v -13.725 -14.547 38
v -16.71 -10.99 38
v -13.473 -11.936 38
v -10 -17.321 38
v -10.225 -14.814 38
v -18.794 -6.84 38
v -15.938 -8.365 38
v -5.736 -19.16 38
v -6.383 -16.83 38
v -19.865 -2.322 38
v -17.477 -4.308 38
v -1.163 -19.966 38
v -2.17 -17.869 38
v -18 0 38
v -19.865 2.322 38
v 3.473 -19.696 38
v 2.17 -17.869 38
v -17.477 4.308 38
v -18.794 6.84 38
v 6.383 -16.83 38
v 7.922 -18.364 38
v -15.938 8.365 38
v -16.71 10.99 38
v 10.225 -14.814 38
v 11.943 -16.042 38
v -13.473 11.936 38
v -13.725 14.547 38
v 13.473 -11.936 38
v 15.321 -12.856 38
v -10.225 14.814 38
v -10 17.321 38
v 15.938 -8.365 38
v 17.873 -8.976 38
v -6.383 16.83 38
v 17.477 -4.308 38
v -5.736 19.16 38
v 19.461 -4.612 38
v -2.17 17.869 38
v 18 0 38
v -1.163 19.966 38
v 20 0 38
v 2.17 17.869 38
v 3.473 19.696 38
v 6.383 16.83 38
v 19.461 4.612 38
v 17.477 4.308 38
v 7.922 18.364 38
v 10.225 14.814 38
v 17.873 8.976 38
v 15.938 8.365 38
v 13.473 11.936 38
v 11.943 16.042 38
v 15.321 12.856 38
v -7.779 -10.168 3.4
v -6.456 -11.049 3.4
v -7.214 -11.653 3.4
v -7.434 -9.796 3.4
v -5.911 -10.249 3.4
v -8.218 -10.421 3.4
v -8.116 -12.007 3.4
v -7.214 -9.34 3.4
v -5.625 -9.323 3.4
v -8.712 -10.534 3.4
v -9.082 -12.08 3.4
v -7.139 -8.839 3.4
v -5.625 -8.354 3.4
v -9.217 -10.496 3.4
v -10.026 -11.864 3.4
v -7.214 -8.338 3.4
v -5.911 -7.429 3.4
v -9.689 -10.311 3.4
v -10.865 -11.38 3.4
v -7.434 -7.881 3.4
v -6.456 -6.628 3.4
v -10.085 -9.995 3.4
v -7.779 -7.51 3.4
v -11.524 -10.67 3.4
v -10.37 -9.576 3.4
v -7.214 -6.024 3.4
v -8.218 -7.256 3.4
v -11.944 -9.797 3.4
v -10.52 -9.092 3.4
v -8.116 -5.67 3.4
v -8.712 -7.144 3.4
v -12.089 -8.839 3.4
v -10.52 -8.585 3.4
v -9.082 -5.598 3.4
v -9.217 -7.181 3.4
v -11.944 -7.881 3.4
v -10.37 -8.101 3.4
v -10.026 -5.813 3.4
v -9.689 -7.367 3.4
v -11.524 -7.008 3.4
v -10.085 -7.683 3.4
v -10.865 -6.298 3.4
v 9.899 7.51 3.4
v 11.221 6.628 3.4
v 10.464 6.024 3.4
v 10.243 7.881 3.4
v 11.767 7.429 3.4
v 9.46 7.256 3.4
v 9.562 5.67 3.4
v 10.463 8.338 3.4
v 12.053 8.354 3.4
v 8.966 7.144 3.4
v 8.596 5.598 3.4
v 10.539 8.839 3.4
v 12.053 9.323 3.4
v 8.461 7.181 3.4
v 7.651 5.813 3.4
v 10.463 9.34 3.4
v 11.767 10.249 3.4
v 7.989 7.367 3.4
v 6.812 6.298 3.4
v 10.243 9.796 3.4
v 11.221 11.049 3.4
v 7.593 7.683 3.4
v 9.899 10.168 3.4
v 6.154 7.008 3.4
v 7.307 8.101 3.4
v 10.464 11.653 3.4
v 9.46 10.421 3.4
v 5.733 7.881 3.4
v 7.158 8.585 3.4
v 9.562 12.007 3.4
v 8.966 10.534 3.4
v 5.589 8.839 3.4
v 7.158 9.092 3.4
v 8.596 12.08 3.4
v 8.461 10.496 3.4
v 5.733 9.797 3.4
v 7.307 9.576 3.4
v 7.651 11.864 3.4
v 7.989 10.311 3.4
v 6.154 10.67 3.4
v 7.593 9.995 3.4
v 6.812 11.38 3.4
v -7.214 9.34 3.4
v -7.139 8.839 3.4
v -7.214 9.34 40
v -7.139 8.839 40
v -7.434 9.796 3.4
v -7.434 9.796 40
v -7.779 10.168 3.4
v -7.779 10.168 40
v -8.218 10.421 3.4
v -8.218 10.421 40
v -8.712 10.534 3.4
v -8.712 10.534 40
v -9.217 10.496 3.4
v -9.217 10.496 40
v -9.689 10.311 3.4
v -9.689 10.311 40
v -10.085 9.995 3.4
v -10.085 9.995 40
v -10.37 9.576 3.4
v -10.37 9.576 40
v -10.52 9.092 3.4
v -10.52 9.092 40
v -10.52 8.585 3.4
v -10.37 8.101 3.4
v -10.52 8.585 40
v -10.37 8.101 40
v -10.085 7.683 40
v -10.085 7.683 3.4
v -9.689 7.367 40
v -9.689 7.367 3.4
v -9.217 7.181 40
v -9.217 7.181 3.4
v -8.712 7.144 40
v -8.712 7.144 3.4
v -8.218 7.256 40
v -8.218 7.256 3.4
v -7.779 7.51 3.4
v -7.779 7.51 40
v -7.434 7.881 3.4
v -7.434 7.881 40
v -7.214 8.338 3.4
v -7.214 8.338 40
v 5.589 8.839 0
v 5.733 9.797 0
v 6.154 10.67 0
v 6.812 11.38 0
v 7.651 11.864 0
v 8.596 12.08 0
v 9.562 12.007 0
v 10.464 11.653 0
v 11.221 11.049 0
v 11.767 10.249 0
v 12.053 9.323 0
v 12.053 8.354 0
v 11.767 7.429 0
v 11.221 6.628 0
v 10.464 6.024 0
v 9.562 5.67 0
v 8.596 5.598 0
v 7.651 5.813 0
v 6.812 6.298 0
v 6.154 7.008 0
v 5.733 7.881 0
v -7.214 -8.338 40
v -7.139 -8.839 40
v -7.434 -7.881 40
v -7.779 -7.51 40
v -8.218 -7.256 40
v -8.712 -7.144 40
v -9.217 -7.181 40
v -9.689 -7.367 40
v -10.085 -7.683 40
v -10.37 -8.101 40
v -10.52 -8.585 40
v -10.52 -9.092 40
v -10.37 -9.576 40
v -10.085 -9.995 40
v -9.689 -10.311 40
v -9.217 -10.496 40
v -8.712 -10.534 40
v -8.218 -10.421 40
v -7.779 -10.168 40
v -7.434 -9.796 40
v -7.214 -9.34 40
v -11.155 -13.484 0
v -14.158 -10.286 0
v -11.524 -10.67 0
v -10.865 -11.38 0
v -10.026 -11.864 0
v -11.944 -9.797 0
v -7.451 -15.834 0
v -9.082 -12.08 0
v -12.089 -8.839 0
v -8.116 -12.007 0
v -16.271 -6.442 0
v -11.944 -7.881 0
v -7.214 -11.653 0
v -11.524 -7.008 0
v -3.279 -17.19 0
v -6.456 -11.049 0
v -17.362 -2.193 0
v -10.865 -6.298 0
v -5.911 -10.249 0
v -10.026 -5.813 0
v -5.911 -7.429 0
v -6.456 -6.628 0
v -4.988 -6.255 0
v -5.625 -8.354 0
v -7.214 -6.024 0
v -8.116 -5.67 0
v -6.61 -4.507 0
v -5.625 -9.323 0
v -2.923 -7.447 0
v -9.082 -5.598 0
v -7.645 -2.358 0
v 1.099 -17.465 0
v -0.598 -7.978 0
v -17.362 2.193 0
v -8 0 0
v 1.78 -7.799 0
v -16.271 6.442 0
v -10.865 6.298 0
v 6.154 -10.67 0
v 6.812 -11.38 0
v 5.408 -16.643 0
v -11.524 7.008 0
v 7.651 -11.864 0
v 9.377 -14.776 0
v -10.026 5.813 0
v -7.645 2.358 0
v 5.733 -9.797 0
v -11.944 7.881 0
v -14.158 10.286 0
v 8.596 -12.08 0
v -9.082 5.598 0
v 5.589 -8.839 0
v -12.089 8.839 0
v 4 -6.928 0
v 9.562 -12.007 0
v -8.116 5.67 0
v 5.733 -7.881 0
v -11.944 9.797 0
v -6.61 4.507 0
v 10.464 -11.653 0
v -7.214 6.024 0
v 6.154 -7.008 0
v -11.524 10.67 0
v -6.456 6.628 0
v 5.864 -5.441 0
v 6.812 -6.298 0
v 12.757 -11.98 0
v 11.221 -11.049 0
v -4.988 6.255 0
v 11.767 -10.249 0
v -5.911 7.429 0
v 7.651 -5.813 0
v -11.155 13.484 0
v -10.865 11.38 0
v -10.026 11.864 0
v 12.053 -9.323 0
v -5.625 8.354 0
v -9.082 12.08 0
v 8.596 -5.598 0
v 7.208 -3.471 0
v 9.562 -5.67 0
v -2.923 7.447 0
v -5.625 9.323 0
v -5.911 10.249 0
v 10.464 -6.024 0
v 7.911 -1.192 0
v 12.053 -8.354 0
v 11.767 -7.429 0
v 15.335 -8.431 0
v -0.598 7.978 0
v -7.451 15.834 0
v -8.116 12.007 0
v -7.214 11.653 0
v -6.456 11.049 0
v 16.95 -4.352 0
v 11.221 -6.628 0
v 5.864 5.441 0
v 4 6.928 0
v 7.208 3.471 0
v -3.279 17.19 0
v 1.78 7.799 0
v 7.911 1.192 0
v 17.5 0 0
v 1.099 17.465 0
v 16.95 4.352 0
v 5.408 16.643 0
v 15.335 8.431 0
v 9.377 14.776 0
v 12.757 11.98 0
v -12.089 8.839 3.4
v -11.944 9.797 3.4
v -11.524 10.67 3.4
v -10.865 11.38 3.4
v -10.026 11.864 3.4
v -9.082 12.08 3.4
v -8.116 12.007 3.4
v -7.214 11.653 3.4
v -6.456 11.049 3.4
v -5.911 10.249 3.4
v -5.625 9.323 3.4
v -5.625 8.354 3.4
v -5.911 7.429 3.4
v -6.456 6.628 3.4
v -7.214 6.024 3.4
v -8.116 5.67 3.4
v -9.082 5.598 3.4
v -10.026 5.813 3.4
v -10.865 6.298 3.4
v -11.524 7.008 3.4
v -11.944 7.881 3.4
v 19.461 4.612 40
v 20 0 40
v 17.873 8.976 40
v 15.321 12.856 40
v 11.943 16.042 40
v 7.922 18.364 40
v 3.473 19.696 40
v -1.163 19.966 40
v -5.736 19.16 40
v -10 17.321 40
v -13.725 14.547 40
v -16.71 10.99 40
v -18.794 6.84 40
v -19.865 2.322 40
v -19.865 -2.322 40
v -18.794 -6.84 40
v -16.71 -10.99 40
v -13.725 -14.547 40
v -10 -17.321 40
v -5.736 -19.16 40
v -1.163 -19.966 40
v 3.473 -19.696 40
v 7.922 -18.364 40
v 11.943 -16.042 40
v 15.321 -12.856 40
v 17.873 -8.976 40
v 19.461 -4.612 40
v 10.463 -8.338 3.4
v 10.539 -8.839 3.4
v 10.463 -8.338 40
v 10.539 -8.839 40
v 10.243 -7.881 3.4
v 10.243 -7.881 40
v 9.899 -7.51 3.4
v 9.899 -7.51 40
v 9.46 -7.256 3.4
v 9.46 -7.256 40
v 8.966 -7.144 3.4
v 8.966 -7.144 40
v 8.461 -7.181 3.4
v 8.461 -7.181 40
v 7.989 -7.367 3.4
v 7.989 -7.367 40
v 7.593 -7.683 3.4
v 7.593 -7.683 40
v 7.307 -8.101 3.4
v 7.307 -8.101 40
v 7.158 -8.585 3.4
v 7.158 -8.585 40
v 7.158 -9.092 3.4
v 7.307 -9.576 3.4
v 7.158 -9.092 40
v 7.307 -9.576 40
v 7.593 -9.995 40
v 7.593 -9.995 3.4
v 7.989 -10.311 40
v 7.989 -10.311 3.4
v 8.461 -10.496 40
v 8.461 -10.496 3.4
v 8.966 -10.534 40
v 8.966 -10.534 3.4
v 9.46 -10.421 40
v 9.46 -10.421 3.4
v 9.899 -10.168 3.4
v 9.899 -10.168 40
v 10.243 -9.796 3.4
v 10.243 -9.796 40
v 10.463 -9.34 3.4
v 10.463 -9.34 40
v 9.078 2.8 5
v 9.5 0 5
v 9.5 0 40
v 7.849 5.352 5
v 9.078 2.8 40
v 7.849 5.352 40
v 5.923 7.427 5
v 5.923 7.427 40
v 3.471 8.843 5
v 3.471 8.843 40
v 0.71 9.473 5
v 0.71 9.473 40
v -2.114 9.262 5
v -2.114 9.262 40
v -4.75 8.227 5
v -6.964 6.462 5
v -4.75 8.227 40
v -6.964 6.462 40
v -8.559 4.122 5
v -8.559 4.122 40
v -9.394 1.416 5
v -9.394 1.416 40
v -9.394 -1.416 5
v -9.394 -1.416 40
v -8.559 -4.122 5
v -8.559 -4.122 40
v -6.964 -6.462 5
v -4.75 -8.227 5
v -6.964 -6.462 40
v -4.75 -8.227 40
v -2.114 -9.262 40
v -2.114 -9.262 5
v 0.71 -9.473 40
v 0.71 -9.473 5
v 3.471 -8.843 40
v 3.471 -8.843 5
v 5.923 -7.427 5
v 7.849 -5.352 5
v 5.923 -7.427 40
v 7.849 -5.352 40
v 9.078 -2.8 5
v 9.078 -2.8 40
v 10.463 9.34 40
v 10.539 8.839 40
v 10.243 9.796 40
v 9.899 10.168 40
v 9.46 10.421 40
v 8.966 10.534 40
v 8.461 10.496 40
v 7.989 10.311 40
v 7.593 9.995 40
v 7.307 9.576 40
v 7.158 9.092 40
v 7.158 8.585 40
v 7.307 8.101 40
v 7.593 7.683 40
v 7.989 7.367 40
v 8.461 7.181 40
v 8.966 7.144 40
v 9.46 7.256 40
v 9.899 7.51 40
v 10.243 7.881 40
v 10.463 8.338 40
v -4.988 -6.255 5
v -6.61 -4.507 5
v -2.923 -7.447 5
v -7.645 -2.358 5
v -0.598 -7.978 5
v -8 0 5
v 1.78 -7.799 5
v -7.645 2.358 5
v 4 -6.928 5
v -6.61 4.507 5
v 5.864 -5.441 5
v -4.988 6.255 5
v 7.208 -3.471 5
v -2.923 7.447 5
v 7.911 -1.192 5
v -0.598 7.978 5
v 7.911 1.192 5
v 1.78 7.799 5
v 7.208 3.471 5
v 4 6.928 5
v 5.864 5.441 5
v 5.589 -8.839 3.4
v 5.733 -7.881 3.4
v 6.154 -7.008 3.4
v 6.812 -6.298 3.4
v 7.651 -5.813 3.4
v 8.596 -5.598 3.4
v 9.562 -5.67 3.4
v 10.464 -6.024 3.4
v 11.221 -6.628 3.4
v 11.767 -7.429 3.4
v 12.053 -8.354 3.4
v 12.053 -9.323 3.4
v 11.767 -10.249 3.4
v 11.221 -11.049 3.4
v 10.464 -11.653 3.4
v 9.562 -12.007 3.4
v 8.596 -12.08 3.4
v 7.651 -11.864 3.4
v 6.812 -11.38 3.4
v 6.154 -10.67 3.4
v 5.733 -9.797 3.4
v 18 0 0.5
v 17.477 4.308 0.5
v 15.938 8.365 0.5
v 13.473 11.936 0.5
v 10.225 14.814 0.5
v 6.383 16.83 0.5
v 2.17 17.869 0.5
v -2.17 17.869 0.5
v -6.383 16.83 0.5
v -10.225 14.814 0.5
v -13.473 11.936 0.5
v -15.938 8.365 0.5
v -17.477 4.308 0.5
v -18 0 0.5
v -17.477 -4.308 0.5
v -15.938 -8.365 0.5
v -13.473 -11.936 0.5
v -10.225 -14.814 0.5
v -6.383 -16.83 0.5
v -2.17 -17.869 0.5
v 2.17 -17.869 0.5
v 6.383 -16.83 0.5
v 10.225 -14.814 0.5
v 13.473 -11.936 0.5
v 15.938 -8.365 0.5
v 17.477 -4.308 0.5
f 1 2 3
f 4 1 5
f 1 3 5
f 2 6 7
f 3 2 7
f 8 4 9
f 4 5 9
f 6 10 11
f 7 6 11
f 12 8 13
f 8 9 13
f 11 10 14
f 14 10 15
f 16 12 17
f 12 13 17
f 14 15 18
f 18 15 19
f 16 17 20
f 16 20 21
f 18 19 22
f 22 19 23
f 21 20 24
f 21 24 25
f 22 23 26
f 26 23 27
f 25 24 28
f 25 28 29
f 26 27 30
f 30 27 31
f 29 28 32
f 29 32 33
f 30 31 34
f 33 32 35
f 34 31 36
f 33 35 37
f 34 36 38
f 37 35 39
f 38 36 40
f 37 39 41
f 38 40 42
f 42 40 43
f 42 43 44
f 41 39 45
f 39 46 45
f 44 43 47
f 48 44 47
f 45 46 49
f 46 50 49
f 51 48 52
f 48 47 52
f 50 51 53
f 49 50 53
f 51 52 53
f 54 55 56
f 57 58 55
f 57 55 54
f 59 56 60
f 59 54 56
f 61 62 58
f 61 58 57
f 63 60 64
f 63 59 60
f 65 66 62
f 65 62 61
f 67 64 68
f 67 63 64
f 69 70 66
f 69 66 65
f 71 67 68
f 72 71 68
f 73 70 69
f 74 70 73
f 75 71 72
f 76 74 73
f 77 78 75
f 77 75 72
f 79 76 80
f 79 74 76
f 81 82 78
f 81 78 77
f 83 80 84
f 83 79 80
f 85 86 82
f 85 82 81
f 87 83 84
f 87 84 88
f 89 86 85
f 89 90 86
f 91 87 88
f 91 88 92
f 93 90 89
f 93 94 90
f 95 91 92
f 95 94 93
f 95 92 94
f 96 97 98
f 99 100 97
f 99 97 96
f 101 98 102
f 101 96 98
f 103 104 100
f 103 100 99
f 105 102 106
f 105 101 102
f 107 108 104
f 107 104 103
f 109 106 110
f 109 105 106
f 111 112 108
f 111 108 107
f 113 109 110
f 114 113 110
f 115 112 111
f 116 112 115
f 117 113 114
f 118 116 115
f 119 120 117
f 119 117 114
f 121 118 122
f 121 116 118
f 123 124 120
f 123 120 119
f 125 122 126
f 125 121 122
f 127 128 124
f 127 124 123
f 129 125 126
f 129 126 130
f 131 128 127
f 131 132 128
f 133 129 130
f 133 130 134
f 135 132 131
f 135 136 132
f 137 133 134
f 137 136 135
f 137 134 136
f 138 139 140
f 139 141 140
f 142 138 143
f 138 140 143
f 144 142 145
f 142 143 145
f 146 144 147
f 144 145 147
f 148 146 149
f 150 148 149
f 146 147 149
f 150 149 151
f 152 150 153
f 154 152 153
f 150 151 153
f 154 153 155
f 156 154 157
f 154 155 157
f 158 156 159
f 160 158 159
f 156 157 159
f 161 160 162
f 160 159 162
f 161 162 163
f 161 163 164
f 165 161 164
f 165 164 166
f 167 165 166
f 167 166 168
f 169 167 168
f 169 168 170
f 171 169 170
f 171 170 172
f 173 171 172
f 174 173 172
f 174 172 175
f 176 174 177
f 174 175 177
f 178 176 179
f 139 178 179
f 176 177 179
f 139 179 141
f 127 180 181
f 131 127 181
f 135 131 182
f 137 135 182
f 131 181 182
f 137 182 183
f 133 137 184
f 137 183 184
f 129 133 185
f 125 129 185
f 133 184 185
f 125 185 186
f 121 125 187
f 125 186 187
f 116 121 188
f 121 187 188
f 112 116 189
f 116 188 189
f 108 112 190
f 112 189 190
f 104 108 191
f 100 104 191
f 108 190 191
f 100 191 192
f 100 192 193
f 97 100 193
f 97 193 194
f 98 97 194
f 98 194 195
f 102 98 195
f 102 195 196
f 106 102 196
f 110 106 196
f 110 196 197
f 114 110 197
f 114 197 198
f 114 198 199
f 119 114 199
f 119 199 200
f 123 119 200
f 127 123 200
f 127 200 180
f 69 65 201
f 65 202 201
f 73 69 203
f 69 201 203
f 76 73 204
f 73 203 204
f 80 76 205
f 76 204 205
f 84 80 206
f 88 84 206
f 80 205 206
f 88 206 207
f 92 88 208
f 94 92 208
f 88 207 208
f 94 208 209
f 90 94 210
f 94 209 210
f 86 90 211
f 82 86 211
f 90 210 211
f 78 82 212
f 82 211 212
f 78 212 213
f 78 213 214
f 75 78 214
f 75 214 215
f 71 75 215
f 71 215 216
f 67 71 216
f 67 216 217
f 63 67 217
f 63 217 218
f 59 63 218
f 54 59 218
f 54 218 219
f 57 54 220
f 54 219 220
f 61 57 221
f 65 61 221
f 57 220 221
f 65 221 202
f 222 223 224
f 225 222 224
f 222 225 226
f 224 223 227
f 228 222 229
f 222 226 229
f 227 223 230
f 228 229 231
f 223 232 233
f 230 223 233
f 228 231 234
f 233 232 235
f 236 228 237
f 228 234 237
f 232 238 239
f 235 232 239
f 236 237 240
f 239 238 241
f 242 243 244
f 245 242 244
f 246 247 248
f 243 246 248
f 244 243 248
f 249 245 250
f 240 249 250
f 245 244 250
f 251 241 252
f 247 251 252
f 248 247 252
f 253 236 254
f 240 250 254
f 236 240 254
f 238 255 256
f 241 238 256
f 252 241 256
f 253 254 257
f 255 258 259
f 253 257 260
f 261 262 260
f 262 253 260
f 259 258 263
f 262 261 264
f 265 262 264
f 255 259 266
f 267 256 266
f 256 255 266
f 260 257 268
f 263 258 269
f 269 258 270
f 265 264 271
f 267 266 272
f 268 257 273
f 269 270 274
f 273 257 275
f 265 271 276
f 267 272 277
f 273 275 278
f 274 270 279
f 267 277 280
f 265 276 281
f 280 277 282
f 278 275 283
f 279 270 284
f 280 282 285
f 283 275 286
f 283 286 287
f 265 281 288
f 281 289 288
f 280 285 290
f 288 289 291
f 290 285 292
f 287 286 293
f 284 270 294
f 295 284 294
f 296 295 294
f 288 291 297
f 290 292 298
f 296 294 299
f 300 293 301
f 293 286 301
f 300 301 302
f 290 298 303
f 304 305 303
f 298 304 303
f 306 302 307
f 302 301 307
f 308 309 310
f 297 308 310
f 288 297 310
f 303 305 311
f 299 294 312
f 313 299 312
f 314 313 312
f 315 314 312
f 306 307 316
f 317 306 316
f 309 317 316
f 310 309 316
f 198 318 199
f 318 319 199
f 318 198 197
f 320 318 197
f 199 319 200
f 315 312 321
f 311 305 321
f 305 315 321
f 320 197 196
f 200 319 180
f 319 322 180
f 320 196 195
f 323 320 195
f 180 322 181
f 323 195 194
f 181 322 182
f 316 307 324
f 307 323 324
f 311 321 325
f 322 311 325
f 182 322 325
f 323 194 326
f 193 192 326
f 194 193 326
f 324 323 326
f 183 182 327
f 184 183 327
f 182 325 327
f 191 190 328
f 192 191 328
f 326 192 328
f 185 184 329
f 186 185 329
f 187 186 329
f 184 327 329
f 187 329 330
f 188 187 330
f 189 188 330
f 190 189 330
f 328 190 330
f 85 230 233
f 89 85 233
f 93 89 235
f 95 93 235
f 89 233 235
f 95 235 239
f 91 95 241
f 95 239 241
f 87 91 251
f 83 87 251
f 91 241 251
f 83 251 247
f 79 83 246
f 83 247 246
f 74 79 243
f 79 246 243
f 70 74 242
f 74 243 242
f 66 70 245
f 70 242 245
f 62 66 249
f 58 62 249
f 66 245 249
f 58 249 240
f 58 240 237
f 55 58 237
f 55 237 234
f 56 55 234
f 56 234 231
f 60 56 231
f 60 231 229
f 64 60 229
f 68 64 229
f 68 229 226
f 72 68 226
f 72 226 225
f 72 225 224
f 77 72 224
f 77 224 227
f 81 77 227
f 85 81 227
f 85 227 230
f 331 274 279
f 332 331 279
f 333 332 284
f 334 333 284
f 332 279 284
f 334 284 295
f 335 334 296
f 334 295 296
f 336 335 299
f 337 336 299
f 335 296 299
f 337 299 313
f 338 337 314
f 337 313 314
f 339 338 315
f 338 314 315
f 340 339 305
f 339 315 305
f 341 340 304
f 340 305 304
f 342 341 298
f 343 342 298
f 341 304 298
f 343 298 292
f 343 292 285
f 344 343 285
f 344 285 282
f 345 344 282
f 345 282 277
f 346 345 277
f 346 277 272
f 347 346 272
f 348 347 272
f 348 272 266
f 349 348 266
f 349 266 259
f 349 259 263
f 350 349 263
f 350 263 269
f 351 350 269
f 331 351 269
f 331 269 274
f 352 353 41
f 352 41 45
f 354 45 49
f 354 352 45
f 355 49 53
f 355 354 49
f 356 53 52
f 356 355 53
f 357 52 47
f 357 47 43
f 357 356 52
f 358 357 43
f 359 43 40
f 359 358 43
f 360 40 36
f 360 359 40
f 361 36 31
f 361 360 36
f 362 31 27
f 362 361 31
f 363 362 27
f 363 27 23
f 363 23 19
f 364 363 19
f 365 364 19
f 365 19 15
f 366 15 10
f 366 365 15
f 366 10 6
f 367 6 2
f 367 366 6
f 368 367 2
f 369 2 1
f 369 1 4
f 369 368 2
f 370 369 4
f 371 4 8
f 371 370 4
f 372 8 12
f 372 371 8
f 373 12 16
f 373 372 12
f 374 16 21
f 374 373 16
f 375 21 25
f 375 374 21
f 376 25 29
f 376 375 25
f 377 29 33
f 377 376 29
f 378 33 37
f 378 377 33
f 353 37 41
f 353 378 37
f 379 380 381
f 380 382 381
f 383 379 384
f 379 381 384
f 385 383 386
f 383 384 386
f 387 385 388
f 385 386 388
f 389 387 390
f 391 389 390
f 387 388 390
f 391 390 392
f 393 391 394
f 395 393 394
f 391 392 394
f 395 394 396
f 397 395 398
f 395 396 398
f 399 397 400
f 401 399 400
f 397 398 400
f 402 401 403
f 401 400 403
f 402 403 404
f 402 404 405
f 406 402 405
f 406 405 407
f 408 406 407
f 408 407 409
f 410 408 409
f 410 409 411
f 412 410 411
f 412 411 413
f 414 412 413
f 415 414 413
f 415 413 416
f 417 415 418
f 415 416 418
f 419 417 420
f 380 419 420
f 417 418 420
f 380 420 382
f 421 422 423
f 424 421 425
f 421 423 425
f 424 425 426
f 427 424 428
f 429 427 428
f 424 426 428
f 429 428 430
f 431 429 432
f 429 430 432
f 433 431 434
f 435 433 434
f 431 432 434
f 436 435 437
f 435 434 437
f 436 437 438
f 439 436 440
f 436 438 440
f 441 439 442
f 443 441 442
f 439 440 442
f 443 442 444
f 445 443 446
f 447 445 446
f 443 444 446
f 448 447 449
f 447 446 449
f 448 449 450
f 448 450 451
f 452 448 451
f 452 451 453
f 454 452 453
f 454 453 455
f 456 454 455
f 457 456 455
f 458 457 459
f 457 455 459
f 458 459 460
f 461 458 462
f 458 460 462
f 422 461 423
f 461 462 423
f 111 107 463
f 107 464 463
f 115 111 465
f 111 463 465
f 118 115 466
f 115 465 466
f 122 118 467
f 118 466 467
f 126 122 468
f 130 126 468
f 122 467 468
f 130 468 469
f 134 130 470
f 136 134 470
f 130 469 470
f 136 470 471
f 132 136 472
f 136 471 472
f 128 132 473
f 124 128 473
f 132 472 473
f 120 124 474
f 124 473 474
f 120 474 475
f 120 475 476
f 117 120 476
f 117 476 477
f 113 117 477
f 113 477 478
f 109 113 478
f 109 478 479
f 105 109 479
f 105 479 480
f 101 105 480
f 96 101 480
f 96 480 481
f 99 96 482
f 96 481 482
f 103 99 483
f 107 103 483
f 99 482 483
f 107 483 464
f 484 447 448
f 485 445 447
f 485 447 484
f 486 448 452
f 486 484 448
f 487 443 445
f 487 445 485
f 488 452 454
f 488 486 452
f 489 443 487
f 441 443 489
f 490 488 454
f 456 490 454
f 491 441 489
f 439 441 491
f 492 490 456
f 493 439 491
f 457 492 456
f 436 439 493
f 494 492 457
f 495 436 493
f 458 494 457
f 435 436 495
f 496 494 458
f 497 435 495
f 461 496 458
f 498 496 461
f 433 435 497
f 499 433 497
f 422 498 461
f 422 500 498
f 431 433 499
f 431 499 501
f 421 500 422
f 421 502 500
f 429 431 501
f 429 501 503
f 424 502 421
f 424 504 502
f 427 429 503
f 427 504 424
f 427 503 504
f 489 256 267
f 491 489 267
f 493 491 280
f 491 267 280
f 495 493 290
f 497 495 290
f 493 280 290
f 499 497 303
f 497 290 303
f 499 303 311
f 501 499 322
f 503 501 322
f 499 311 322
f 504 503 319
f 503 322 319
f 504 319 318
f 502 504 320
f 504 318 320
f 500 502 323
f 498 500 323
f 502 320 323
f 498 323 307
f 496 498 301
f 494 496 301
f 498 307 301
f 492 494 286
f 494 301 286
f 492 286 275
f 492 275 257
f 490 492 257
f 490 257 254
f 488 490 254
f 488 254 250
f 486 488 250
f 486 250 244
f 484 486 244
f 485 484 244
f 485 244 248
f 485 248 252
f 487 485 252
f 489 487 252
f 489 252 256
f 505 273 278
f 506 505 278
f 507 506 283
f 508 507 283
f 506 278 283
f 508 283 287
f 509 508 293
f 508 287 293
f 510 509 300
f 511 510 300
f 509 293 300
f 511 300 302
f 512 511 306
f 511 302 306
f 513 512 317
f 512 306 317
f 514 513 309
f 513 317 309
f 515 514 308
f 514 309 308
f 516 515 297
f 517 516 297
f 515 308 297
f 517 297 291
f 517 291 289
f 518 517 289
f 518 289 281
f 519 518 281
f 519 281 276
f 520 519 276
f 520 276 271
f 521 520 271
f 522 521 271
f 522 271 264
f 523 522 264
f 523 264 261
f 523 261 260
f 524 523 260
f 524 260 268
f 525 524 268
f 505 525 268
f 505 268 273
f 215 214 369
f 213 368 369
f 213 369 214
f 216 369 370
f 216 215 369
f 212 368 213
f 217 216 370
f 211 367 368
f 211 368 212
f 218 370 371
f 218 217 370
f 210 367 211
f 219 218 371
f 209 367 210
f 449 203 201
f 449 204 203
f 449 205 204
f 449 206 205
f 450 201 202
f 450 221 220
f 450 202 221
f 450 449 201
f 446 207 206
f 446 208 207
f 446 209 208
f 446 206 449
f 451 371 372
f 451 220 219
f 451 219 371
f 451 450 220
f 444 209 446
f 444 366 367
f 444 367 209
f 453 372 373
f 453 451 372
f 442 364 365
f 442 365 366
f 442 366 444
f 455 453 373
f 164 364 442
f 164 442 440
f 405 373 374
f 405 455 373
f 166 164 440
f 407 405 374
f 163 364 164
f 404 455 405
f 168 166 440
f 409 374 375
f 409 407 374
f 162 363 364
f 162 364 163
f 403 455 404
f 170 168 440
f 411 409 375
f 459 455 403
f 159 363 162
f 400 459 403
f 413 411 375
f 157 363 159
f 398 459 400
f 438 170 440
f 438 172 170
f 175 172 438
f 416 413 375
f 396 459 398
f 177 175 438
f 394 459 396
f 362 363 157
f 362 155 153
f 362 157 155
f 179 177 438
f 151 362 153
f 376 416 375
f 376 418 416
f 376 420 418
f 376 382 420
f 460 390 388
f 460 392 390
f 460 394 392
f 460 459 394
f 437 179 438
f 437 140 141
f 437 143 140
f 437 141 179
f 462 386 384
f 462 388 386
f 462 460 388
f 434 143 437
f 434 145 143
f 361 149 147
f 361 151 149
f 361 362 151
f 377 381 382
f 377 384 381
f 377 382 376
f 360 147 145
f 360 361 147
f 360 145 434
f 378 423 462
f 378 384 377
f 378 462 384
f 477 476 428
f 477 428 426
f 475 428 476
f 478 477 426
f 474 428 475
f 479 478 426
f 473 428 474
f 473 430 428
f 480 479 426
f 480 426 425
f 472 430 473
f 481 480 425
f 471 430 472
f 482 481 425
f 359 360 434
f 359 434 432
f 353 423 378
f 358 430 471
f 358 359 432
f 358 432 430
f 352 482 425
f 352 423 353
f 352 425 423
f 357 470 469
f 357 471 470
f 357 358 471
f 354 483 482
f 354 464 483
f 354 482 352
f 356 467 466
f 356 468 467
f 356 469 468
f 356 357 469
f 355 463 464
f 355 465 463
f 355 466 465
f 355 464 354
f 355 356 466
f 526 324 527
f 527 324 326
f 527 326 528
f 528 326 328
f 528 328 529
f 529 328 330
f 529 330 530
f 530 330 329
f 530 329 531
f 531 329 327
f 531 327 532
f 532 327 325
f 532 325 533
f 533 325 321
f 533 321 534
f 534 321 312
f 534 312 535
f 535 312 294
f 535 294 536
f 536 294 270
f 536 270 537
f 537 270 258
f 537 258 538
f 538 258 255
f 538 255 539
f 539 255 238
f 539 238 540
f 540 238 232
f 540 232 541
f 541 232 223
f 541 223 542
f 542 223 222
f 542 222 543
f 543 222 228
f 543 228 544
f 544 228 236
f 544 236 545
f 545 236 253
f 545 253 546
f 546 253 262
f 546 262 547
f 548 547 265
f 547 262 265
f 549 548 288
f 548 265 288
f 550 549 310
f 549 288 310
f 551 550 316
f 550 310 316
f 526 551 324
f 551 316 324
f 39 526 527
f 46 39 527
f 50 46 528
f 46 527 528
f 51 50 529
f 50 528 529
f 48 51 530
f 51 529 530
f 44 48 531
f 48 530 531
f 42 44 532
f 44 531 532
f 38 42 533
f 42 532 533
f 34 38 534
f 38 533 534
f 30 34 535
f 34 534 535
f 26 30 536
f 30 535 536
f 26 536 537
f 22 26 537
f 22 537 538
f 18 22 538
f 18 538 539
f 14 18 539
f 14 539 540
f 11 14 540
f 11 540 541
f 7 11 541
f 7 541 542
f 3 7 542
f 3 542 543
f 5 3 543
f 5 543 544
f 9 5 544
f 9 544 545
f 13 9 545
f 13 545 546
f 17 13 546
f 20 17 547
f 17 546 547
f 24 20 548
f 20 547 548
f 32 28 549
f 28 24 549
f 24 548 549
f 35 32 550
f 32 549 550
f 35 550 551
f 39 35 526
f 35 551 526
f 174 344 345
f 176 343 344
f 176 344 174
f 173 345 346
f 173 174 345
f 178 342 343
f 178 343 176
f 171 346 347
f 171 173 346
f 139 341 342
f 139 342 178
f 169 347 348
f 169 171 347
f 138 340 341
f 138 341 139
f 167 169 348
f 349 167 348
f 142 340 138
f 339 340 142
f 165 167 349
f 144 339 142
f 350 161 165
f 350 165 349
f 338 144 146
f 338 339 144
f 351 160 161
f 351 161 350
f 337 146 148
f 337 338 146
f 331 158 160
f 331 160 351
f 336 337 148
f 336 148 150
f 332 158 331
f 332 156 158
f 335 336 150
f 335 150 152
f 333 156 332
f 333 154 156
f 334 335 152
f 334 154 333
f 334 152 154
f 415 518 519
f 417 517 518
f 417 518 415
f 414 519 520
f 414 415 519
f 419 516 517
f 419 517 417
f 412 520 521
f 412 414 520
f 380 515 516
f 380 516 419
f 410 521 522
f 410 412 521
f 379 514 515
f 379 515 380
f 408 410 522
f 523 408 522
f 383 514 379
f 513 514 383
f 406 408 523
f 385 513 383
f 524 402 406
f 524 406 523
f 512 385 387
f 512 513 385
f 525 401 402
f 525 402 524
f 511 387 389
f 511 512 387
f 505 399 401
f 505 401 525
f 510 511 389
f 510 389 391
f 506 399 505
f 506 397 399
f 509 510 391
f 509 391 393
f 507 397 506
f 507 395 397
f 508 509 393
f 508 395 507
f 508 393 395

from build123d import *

# Parameters (mm, degrees)
ESQUISSE1_R                                         = 18
BOSS_EXTRU_1_DEPTH                                  = 40
SKETCH1_R                                           = 20
BOSS_EXTRUDE1_DEPTH                                 = 2
CBORE_FOR_M3_HEX_SOCKET_HEAD_CAP_SCREW1_D           = 3.4
CBORE_FOR_M3_HEX_SOCKET_HEAD_CAP_SCREW1_CBORE_D     = 6.5
CBORE_FOR_M3_HEX_SOCKET_HEAD_CAP_SCREW1_CBORE_DEPTH = 3.4
ESQUISSE5_R                                         = 9.5
ENL_V_MAT_EXTRU_1_DEPTH                             = 35
ESQUISSE6_R                                         = 8
CUT_EXTRUDE2_DEPTH                                  = 41
CHAMFER1_SIZE                                       = 0.5


with BuildPart() as part:
    # Esquisse1 → Boss.-Extru.1 (new body)
    with BuildSketch(Plane.XY):
        Circle(ESQUISSE1_R)
    extrude(amount=BOSS_EXTRU_1_DEPTH)

    # Sketch1 → Boss-Extrude1 (add)
    with BuildSketch(Plane.XY.offset(40)):
        Circle(SKETCH1_R)
    extrude(amount=-BOSS_EXTRUDE1_DEPTH)

    # CBORE for M3 Hex Socket Head Cap Screw1 (through all)
    with Locations(Plane(origin=(0, 0, 0), x_dir=(-1, 0, 0), z_dir=(0, 0, -1))):
        with Locations((-8.838834765, -8.838834765), (-8.838834765, 8.838834765), (8.838834765, -8.838834765), (8.838834765, 8.838834765), (0, 0)):
            CounterBoreHole(CBORE_FOR_M3_HEX_SOCKET_HEAD_CAP_SCREW1_D / 2, CBORE_FOR_M3_HEX_SOCKET_HEAD_CAP_SCREW1_CBORE_D / 2, CBORE_FOR_M3_HEX_SOCKET_HEAD_CAP_SCREW1_CBORE_DEPTH)

    # Esquisse5 → Enlèv. mat.-Extru.1 (cut)
    with BuildSketch(Plane.XY.offset(40)):
        Circle(ESQUISSE5_R)
    extrude(amount=-ENL_V_MAT_EXTRU_1_DEPTH, mode=Mode.SUBTRACT)

    # Esquisse6 → Cut-Extrude2 (cut, through all)
    with BuildSketch(Plane(origin=(0, 0, 0), x_dir=(-1, 0, 0), z_dir=(0, 0, -1))):
        Circle(ESQUISSE6_R)
    extrude(amount=-CUT_EXTRUDE2_DEPTH, mode=Mode.SUBTRACT)

    # Chamfer1
    chamfer1_edges = [part.edges().sort_by_distance(p)[0] for p in [
        (-18, 0, 0),
    ]]
    chamfer(chamfer1_edges, length=CHAMFER1_SIZE)


solid = part.part
